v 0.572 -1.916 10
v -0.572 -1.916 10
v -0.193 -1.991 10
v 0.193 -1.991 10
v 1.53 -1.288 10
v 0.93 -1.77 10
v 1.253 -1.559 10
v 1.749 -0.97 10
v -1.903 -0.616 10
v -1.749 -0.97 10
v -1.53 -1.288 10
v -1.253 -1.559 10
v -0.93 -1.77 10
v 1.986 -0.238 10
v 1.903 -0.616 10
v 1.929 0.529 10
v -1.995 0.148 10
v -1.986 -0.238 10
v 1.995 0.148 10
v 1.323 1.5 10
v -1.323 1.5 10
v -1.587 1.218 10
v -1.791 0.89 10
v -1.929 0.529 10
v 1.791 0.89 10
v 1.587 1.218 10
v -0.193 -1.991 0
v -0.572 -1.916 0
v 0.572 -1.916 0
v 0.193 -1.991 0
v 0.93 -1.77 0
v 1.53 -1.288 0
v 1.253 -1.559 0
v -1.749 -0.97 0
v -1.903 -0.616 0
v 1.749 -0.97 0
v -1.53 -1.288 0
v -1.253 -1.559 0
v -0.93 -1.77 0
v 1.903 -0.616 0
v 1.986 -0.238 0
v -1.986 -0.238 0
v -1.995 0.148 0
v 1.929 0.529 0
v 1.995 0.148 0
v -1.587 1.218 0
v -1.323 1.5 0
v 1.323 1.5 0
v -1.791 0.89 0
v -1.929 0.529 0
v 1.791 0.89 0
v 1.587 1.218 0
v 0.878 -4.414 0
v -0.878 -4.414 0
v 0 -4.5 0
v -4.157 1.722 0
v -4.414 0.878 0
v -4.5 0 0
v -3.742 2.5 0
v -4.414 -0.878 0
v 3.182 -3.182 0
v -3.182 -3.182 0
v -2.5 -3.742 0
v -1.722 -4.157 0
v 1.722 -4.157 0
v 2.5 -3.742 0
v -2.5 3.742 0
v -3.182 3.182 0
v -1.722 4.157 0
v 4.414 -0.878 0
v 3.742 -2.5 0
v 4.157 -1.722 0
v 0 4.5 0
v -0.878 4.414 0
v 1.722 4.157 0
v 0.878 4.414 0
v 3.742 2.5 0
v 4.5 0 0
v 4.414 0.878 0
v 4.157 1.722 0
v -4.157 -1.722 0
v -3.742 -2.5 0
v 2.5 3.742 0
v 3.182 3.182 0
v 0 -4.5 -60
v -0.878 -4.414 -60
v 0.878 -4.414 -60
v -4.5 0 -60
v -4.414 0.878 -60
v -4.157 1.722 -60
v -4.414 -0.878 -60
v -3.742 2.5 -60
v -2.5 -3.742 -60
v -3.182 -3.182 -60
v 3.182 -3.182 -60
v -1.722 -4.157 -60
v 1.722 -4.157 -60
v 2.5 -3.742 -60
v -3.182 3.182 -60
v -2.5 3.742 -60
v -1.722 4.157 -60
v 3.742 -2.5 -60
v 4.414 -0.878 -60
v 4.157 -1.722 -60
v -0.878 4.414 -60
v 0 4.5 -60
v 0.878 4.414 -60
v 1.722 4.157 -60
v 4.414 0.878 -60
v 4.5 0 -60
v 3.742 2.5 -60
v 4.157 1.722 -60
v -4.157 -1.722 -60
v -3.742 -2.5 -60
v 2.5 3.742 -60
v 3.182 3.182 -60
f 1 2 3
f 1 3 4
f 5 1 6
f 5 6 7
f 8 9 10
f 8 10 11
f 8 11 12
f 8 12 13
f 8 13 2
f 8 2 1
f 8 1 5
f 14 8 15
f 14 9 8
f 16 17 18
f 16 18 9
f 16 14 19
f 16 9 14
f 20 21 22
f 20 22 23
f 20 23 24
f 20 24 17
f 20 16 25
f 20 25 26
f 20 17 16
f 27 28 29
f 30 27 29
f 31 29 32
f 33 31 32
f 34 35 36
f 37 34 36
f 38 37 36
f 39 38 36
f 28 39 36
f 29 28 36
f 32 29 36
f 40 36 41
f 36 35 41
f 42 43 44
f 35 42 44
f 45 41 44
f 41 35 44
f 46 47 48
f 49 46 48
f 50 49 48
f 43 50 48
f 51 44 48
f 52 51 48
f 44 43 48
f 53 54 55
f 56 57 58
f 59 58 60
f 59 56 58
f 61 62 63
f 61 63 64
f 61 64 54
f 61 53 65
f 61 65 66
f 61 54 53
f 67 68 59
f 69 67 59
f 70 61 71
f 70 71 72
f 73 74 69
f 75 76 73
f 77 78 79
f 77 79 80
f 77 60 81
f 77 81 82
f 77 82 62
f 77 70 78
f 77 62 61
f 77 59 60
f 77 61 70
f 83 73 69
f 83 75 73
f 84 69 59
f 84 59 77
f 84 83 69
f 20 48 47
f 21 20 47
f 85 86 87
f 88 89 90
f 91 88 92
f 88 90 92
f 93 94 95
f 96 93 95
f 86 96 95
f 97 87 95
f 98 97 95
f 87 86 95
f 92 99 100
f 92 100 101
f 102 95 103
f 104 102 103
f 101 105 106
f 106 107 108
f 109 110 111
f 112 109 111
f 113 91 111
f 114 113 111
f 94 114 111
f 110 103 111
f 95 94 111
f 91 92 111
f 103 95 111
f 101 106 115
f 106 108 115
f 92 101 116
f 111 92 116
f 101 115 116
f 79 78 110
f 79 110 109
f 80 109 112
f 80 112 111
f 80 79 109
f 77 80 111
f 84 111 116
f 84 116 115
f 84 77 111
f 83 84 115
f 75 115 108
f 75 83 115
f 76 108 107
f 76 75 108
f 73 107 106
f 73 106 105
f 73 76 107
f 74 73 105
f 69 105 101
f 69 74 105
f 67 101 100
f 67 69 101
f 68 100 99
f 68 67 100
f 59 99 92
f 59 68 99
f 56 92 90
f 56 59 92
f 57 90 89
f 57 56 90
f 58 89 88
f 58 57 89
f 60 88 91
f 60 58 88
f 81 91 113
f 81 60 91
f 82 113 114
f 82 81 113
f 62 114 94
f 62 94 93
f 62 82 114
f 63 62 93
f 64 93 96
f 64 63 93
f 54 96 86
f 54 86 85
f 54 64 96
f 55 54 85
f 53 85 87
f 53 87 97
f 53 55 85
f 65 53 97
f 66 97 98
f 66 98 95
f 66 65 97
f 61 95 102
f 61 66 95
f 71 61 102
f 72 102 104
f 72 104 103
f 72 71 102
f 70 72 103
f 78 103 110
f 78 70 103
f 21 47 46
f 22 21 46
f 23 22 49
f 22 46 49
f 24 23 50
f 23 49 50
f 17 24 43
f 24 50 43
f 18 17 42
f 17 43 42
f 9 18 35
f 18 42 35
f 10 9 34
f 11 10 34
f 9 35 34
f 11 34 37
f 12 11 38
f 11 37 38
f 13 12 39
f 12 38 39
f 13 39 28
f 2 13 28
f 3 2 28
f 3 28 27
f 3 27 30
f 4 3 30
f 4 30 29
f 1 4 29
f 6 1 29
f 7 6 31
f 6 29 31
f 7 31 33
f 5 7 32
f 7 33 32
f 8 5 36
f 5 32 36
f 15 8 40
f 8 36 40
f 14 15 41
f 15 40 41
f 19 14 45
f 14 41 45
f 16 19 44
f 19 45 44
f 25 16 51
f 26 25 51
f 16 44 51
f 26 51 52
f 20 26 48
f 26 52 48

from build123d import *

# Parameters (mm, degrees)
F0_R     = 4.5
F1_DEPTH = 60
F2_DEPTH = 10


with BuildPart() as f1:
    # F0 (on Top) → F1 (new body)
    with BuildSketch(Plane.XY):
        Circle(F0_R)
        with BuildLine():
            ThreePointArc((1.322876, 1.5), (0, -2), (-1.322876, 1.5))
            Line((-1.322876, 1.5), (1.322876, 1.5))
        make_face(mode=Mode.SUBTRACT)
        with BuildLine():
            Line((1.322876, 1.5), (-1.322876, 1.5))
            ThreePointArc((-1.322876, 1.5), (0, -2), (1.322876, 1.5))
        make_face()
    extrude(amount=-F1_DEPTH)


with BuildPart() as f2:
    # F0 (on Top) → F2 (new body)
    with BuildSketch(Plane.XY):
        with BuildLine():
            Line((1.322876, 1.5), (-1.322876, 1.5))
            ThreePointArc((-1.322876, 1.5), (0, -2), (1.322876, 1.5))
        make_face()
    extrude(amount=F2_DEPTH)


solid = Compound([f1.part, f2.part])
